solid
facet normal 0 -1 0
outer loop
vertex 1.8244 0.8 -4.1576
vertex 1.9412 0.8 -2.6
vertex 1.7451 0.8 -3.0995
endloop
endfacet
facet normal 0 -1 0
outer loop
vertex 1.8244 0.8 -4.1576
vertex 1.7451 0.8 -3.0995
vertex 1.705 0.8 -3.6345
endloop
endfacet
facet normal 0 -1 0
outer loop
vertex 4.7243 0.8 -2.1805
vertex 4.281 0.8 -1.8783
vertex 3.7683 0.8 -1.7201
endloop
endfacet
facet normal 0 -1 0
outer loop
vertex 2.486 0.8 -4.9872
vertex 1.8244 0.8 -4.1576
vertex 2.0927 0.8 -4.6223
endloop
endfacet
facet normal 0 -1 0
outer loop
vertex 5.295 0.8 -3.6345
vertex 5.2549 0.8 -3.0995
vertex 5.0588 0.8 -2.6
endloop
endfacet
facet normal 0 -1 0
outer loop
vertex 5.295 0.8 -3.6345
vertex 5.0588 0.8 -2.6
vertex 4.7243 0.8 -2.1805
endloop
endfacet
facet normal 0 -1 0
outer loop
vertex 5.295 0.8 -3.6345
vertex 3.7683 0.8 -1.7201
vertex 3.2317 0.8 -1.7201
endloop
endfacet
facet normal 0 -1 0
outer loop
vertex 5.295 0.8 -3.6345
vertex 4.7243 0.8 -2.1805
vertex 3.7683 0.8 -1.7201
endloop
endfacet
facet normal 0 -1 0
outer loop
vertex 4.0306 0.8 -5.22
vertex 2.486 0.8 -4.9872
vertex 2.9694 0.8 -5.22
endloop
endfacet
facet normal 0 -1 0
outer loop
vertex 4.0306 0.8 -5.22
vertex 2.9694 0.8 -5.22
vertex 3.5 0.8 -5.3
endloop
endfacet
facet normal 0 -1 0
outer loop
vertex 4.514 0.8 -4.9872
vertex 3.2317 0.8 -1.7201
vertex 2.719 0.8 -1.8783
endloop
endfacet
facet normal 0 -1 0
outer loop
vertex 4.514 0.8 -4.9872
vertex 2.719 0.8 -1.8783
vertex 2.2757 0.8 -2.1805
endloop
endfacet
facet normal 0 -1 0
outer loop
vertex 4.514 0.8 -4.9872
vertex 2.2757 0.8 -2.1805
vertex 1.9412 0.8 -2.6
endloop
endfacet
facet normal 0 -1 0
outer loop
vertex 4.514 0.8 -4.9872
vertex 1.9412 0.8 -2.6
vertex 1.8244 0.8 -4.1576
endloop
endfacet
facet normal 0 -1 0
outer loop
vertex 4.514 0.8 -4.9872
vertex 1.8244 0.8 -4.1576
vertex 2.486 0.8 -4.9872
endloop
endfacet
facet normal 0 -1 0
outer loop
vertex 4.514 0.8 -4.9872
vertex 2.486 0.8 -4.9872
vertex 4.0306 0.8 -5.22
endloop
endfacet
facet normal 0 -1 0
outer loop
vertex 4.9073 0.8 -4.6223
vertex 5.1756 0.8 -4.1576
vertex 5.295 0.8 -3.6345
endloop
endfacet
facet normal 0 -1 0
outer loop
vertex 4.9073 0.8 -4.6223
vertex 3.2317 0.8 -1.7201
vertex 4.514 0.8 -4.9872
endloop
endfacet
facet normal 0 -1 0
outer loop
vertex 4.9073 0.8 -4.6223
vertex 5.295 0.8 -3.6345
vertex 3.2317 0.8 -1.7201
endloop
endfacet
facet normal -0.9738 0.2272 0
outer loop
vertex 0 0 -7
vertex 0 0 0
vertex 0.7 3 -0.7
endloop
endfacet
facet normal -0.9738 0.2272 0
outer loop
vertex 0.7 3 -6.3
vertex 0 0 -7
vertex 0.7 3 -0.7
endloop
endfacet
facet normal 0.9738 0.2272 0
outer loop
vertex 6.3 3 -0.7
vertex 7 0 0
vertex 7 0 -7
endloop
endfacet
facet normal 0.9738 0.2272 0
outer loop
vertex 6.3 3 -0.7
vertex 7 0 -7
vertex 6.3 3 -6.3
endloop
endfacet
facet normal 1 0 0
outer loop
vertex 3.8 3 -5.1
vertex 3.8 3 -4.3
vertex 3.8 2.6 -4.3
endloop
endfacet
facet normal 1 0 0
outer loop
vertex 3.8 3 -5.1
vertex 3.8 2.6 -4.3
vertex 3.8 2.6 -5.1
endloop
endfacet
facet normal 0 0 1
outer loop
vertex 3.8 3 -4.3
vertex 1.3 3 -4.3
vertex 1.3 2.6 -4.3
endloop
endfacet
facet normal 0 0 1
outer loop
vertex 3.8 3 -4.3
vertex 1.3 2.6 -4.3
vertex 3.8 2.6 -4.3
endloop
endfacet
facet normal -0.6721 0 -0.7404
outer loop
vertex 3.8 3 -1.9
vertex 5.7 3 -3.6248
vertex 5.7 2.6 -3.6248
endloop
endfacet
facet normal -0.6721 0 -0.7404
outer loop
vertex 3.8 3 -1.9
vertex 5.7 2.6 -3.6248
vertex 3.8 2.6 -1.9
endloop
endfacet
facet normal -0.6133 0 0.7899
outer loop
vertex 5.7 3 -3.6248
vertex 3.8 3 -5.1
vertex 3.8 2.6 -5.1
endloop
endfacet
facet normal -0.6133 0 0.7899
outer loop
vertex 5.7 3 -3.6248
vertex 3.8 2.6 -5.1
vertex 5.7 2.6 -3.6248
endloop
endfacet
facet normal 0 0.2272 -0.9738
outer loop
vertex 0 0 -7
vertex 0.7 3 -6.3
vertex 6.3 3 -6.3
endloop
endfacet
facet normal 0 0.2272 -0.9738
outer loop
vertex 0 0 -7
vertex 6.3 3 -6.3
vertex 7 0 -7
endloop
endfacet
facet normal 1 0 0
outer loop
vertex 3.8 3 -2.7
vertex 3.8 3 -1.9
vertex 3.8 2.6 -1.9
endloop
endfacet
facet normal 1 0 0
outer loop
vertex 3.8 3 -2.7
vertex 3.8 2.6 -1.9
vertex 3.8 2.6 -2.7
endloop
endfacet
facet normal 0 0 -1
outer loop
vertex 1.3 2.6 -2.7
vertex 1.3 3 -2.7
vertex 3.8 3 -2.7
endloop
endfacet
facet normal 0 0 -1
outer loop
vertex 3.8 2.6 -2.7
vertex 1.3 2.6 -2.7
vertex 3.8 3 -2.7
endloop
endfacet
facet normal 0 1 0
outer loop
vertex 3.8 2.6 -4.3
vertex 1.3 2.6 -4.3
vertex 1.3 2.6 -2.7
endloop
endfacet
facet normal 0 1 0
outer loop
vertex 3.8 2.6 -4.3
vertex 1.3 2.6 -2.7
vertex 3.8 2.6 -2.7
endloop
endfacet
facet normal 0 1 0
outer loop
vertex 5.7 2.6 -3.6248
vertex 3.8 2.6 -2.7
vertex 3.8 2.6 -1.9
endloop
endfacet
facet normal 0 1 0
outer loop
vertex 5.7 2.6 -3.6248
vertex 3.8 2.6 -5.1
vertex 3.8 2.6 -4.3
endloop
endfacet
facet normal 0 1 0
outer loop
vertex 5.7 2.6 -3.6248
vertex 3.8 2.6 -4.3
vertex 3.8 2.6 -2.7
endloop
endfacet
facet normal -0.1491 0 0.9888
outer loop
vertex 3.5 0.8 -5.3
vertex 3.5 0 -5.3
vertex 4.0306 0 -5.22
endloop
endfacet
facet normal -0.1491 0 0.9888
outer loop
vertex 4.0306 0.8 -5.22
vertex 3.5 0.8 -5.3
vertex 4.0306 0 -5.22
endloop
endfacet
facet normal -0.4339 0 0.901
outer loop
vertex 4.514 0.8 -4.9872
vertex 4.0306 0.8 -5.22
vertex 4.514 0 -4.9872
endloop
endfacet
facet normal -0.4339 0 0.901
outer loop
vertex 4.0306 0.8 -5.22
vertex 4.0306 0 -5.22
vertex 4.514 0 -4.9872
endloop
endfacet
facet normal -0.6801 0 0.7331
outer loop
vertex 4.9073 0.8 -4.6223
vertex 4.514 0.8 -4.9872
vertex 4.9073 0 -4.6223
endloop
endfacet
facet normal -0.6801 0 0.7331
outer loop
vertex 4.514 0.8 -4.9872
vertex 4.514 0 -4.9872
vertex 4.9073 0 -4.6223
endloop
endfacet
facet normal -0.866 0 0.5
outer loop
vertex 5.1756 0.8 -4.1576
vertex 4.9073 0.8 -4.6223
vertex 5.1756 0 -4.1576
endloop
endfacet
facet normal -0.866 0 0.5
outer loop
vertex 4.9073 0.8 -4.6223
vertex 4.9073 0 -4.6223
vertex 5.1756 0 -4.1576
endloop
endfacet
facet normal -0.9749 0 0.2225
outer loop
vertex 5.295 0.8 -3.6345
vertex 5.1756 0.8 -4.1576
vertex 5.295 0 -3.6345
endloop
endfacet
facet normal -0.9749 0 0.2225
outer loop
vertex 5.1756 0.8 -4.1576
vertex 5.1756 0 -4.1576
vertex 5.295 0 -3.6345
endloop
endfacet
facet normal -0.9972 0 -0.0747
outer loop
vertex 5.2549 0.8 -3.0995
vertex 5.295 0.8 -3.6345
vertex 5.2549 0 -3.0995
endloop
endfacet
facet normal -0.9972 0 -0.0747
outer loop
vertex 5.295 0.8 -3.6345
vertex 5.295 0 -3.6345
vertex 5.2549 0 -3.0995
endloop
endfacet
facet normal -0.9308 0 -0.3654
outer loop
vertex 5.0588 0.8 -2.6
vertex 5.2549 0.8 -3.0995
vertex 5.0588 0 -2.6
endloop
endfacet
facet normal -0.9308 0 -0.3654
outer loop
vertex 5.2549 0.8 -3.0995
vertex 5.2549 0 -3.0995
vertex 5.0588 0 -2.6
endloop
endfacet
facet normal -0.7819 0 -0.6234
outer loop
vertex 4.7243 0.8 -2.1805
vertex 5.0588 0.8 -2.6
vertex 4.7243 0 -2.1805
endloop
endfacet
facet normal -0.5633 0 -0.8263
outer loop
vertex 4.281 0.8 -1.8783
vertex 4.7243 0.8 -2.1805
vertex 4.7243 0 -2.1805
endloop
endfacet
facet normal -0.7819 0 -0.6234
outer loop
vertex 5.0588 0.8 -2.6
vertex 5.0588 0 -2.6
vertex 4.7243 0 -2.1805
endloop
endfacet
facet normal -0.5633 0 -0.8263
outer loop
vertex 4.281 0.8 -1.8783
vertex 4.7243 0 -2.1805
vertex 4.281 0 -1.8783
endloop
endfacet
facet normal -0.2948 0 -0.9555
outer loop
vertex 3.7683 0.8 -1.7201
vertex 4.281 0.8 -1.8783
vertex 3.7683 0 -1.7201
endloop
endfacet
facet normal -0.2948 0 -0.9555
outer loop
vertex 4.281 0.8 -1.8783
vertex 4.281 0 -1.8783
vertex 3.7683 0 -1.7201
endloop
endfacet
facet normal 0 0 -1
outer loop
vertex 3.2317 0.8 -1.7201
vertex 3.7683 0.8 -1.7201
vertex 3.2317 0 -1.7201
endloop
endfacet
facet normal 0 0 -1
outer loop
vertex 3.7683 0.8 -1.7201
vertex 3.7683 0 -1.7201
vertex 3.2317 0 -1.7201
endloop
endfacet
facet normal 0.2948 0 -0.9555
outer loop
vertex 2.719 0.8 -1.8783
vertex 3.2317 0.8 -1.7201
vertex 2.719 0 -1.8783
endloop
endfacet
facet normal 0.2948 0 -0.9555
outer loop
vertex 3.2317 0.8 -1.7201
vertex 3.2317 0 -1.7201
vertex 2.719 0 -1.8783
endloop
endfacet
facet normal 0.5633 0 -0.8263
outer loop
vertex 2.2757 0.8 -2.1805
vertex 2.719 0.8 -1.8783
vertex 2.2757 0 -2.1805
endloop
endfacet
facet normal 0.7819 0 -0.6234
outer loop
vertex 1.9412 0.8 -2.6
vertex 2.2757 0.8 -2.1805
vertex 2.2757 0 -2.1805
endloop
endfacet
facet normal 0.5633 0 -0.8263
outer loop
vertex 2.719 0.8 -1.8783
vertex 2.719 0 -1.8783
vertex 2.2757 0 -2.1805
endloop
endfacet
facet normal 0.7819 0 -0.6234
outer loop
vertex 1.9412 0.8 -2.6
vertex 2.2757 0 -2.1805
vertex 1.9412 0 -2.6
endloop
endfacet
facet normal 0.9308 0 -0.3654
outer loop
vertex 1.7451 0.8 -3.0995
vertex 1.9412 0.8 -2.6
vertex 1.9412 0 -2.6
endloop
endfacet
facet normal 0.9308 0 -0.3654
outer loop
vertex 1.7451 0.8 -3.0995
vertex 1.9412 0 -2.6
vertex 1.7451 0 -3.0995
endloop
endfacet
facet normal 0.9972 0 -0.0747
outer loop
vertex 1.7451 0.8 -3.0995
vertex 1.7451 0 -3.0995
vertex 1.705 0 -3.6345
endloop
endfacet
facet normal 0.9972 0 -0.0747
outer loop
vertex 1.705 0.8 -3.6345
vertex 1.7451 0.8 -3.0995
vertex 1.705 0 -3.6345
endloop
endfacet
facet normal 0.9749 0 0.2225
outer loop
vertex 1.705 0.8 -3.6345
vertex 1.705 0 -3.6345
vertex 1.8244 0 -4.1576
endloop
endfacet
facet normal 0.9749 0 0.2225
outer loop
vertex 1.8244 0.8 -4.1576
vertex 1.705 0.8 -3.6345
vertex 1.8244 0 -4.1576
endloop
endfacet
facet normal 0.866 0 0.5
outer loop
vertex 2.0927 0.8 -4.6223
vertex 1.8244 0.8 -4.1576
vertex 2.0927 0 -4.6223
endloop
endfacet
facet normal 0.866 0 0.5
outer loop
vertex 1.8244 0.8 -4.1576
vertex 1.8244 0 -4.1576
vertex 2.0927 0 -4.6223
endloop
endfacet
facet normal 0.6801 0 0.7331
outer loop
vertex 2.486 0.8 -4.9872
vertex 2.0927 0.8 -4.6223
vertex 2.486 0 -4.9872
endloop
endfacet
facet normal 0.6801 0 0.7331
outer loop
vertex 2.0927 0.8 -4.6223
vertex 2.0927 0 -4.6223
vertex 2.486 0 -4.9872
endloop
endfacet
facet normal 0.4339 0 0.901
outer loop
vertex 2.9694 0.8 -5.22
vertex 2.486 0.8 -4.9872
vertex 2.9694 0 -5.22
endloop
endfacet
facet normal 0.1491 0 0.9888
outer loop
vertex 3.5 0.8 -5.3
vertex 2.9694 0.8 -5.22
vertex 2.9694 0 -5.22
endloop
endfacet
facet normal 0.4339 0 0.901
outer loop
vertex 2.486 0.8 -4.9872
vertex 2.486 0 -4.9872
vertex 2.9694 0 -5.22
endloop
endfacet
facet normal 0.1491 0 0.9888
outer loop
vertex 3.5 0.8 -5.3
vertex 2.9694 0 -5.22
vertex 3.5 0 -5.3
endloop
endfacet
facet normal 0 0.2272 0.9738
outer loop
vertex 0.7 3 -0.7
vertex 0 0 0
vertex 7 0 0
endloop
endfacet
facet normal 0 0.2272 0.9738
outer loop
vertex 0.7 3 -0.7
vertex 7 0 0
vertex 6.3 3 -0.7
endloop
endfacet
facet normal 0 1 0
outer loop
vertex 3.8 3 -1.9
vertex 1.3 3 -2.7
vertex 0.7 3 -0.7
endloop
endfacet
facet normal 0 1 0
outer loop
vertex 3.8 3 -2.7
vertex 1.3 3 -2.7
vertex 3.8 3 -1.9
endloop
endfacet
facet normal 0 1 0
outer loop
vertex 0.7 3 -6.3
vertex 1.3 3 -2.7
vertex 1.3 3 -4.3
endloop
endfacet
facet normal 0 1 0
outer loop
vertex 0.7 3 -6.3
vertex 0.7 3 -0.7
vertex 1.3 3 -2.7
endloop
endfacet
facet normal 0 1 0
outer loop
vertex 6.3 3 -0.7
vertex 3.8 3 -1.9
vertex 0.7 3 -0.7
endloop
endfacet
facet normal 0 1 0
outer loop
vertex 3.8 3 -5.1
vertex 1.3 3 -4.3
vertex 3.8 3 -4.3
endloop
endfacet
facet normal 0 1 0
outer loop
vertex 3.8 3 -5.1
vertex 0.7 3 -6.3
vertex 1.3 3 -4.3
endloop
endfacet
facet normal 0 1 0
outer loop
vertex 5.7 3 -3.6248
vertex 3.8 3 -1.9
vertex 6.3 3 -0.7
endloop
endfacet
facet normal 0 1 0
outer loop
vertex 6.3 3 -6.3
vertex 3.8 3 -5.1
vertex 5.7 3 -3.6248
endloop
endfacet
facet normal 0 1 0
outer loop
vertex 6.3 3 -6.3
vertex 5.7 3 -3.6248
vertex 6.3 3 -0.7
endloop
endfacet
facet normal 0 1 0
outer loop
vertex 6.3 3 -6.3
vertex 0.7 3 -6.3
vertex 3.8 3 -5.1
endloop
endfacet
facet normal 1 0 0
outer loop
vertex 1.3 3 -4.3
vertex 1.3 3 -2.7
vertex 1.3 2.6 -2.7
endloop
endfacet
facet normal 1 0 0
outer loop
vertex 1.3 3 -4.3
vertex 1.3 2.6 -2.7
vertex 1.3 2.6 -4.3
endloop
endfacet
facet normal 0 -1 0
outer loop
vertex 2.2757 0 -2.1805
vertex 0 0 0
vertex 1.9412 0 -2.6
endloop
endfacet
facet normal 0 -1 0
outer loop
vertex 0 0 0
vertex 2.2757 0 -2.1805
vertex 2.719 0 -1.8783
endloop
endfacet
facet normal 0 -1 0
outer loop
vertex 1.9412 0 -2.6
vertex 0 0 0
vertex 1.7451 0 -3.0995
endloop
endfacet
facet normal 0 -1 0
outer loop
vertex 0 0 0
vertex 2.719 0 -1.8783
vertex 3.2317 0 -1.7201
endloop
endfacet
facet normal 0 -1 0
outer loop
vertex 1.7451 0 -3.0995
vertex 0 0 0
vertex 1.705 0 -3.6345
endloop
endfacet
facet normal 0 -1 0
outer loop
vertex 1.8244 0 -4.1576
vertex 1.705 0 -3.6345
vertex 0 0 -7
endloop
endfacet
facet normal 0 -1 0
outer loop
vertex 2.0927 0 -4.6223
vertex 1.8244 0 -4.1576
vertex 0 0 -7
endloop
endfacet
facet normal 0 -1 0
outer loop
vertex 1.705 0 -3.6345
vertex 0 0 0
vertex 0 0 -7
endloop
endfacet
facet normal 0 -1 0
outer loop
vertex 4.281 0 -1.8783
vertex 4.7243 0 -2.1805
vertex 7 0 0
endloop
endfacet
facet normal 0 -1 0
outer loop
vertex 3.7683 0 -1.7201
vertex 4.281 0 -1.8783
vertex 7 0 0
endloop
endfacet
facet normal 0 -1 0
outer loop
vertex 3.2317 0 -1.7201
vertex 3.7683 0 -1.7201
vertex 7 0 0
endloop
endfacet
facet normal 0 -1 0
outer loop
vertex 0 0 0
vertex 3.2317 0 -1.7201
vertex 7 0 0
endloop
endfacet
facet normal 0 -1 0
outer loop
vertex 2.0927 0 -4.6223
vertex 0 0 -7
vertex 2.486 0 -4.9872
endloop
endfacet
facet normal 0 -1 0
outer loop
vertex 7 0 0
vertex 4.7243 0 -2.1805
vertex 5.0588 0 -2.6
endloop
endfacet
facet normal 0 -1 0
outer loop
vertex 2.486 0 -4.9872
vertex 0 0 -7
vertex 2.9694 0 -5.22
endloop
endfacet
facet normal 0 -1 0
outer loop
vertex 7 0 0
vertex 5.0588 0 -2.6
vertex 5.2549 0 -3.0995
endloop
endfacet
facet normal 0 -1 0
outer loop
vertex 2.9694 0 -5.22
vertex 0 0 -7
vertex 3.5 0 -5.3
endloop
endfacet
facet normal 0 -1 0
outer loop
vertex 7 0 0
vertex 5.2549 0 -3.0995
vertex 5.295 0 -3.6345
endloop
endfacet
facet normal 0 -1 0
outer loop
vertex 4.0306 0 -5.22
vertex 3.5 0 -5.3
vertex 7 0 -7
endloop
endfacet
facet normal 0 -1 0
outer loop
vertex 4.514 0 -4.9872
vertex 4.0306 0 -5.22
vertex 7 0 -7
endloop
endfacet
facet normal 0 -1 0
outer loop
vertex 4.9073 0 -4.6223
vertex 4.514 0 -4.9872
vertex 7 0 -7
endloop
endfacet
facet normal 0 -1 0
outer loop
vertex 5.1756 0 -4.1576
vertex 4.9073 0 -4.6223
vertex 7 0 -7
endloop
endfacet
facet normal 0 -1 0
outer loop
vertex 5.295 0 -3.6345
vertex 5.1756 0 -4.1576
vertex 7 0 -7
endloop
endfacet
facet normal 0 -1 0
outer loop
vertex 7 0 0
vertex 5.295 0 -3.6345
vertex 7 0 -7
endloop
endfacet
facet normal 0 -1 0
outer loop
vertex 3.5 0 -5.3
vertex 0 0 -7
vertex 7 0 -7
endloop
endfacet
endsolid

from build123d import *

# Parameters (mm, degrees)
SKETCH1_W           = 7
SKETCH1_H           = 7
BOSS_EXTRUDE1_DEPTH = 3
CUT_EXTRUDE1_DEPTH  = 7
CUT_EXTRUDE2_DEPTH  = 11
SKETCH4_R           = 1.8
CUT_EXTRUDE3_DEPTH  = 0.8
SKETCH5_W           = 2.5
SKETCH5_H           = 1.6
CUT_EXTRUDE4_DEPTH  = 0.4


with BuildPart() as part:
    # Sketch1 → Boss-Extrude1 (new body)
    with BuildSketch(Plane(origin=(0, 0, 0), x_dir=(1, 0, 0), z_dir=(0, 1, 0))):
        with Locations((3.5, 3.5)):
            Rectangle(SKETCH1_W, SKETCH1_H)
    extrude(amount=BOSS_EXTRUDE1_DEPTH)

    # Sketch2 → Cut-Extrude1 (cut)
    with BuildSketch(Plane.XY):
        Polygon((0, 0), (0.7, 3), (0, 3), align=None)
        Polygon((7, 0), (6.3, 3), (7, 3), align=None)
    extrude(amount=-CUT_EXTRUDE1_DEPTH, mode=Mode.SUBTRACT)

    # Sketch3 → Cut-Extrude2 (cut)
    with BuildSketch(Plane(origin=(0, 0, 0), x_dir=(0, 0, -1), z_dir=(1, 0, 0))):
        Polygon((0, 0), (0.7, 3), (0, 3), align=None)
        Polygon((7, 3), (6.3, 3), (7, 0), align=None)
    extrude(amount=CUT_EXTRUDE2_DEPTH, mode=Mode.SUBTRACT)

    # Sketch4 → Cut-Extrude3 (cut)
    with BuildSketch(Plane.XZ):
        with Locations(Location((3.5, -3.5, 0), (0, 0, 270))):
            Circle(SKETCH4_R)
    extrude(amount=-CUT_EXTRUDE3_DEPTH, mode=Mode.SUBTRACT)

    # Sketch5 → Cut-Extrude4 (cut)
    with BuildSketch(Plane(origin=(0, 3, 0), x_dir=(1, 0, 0), z_dir=(0, 1, 0))):
        with Locations((2.55, 3.5)):
            Rectangle(SKETCH5_W, SKETCH5_H)
        Polygon((3.8, 1.9), (3.8, 2.7), (3.8, 4.3), (3.8, 5.1), (5.7, 3.624818901), align=None)
    extrude(amount=-CUT_EXTRUDE4_DEPTH, mode=Mode.SUBTRACT)


solid = part.part
